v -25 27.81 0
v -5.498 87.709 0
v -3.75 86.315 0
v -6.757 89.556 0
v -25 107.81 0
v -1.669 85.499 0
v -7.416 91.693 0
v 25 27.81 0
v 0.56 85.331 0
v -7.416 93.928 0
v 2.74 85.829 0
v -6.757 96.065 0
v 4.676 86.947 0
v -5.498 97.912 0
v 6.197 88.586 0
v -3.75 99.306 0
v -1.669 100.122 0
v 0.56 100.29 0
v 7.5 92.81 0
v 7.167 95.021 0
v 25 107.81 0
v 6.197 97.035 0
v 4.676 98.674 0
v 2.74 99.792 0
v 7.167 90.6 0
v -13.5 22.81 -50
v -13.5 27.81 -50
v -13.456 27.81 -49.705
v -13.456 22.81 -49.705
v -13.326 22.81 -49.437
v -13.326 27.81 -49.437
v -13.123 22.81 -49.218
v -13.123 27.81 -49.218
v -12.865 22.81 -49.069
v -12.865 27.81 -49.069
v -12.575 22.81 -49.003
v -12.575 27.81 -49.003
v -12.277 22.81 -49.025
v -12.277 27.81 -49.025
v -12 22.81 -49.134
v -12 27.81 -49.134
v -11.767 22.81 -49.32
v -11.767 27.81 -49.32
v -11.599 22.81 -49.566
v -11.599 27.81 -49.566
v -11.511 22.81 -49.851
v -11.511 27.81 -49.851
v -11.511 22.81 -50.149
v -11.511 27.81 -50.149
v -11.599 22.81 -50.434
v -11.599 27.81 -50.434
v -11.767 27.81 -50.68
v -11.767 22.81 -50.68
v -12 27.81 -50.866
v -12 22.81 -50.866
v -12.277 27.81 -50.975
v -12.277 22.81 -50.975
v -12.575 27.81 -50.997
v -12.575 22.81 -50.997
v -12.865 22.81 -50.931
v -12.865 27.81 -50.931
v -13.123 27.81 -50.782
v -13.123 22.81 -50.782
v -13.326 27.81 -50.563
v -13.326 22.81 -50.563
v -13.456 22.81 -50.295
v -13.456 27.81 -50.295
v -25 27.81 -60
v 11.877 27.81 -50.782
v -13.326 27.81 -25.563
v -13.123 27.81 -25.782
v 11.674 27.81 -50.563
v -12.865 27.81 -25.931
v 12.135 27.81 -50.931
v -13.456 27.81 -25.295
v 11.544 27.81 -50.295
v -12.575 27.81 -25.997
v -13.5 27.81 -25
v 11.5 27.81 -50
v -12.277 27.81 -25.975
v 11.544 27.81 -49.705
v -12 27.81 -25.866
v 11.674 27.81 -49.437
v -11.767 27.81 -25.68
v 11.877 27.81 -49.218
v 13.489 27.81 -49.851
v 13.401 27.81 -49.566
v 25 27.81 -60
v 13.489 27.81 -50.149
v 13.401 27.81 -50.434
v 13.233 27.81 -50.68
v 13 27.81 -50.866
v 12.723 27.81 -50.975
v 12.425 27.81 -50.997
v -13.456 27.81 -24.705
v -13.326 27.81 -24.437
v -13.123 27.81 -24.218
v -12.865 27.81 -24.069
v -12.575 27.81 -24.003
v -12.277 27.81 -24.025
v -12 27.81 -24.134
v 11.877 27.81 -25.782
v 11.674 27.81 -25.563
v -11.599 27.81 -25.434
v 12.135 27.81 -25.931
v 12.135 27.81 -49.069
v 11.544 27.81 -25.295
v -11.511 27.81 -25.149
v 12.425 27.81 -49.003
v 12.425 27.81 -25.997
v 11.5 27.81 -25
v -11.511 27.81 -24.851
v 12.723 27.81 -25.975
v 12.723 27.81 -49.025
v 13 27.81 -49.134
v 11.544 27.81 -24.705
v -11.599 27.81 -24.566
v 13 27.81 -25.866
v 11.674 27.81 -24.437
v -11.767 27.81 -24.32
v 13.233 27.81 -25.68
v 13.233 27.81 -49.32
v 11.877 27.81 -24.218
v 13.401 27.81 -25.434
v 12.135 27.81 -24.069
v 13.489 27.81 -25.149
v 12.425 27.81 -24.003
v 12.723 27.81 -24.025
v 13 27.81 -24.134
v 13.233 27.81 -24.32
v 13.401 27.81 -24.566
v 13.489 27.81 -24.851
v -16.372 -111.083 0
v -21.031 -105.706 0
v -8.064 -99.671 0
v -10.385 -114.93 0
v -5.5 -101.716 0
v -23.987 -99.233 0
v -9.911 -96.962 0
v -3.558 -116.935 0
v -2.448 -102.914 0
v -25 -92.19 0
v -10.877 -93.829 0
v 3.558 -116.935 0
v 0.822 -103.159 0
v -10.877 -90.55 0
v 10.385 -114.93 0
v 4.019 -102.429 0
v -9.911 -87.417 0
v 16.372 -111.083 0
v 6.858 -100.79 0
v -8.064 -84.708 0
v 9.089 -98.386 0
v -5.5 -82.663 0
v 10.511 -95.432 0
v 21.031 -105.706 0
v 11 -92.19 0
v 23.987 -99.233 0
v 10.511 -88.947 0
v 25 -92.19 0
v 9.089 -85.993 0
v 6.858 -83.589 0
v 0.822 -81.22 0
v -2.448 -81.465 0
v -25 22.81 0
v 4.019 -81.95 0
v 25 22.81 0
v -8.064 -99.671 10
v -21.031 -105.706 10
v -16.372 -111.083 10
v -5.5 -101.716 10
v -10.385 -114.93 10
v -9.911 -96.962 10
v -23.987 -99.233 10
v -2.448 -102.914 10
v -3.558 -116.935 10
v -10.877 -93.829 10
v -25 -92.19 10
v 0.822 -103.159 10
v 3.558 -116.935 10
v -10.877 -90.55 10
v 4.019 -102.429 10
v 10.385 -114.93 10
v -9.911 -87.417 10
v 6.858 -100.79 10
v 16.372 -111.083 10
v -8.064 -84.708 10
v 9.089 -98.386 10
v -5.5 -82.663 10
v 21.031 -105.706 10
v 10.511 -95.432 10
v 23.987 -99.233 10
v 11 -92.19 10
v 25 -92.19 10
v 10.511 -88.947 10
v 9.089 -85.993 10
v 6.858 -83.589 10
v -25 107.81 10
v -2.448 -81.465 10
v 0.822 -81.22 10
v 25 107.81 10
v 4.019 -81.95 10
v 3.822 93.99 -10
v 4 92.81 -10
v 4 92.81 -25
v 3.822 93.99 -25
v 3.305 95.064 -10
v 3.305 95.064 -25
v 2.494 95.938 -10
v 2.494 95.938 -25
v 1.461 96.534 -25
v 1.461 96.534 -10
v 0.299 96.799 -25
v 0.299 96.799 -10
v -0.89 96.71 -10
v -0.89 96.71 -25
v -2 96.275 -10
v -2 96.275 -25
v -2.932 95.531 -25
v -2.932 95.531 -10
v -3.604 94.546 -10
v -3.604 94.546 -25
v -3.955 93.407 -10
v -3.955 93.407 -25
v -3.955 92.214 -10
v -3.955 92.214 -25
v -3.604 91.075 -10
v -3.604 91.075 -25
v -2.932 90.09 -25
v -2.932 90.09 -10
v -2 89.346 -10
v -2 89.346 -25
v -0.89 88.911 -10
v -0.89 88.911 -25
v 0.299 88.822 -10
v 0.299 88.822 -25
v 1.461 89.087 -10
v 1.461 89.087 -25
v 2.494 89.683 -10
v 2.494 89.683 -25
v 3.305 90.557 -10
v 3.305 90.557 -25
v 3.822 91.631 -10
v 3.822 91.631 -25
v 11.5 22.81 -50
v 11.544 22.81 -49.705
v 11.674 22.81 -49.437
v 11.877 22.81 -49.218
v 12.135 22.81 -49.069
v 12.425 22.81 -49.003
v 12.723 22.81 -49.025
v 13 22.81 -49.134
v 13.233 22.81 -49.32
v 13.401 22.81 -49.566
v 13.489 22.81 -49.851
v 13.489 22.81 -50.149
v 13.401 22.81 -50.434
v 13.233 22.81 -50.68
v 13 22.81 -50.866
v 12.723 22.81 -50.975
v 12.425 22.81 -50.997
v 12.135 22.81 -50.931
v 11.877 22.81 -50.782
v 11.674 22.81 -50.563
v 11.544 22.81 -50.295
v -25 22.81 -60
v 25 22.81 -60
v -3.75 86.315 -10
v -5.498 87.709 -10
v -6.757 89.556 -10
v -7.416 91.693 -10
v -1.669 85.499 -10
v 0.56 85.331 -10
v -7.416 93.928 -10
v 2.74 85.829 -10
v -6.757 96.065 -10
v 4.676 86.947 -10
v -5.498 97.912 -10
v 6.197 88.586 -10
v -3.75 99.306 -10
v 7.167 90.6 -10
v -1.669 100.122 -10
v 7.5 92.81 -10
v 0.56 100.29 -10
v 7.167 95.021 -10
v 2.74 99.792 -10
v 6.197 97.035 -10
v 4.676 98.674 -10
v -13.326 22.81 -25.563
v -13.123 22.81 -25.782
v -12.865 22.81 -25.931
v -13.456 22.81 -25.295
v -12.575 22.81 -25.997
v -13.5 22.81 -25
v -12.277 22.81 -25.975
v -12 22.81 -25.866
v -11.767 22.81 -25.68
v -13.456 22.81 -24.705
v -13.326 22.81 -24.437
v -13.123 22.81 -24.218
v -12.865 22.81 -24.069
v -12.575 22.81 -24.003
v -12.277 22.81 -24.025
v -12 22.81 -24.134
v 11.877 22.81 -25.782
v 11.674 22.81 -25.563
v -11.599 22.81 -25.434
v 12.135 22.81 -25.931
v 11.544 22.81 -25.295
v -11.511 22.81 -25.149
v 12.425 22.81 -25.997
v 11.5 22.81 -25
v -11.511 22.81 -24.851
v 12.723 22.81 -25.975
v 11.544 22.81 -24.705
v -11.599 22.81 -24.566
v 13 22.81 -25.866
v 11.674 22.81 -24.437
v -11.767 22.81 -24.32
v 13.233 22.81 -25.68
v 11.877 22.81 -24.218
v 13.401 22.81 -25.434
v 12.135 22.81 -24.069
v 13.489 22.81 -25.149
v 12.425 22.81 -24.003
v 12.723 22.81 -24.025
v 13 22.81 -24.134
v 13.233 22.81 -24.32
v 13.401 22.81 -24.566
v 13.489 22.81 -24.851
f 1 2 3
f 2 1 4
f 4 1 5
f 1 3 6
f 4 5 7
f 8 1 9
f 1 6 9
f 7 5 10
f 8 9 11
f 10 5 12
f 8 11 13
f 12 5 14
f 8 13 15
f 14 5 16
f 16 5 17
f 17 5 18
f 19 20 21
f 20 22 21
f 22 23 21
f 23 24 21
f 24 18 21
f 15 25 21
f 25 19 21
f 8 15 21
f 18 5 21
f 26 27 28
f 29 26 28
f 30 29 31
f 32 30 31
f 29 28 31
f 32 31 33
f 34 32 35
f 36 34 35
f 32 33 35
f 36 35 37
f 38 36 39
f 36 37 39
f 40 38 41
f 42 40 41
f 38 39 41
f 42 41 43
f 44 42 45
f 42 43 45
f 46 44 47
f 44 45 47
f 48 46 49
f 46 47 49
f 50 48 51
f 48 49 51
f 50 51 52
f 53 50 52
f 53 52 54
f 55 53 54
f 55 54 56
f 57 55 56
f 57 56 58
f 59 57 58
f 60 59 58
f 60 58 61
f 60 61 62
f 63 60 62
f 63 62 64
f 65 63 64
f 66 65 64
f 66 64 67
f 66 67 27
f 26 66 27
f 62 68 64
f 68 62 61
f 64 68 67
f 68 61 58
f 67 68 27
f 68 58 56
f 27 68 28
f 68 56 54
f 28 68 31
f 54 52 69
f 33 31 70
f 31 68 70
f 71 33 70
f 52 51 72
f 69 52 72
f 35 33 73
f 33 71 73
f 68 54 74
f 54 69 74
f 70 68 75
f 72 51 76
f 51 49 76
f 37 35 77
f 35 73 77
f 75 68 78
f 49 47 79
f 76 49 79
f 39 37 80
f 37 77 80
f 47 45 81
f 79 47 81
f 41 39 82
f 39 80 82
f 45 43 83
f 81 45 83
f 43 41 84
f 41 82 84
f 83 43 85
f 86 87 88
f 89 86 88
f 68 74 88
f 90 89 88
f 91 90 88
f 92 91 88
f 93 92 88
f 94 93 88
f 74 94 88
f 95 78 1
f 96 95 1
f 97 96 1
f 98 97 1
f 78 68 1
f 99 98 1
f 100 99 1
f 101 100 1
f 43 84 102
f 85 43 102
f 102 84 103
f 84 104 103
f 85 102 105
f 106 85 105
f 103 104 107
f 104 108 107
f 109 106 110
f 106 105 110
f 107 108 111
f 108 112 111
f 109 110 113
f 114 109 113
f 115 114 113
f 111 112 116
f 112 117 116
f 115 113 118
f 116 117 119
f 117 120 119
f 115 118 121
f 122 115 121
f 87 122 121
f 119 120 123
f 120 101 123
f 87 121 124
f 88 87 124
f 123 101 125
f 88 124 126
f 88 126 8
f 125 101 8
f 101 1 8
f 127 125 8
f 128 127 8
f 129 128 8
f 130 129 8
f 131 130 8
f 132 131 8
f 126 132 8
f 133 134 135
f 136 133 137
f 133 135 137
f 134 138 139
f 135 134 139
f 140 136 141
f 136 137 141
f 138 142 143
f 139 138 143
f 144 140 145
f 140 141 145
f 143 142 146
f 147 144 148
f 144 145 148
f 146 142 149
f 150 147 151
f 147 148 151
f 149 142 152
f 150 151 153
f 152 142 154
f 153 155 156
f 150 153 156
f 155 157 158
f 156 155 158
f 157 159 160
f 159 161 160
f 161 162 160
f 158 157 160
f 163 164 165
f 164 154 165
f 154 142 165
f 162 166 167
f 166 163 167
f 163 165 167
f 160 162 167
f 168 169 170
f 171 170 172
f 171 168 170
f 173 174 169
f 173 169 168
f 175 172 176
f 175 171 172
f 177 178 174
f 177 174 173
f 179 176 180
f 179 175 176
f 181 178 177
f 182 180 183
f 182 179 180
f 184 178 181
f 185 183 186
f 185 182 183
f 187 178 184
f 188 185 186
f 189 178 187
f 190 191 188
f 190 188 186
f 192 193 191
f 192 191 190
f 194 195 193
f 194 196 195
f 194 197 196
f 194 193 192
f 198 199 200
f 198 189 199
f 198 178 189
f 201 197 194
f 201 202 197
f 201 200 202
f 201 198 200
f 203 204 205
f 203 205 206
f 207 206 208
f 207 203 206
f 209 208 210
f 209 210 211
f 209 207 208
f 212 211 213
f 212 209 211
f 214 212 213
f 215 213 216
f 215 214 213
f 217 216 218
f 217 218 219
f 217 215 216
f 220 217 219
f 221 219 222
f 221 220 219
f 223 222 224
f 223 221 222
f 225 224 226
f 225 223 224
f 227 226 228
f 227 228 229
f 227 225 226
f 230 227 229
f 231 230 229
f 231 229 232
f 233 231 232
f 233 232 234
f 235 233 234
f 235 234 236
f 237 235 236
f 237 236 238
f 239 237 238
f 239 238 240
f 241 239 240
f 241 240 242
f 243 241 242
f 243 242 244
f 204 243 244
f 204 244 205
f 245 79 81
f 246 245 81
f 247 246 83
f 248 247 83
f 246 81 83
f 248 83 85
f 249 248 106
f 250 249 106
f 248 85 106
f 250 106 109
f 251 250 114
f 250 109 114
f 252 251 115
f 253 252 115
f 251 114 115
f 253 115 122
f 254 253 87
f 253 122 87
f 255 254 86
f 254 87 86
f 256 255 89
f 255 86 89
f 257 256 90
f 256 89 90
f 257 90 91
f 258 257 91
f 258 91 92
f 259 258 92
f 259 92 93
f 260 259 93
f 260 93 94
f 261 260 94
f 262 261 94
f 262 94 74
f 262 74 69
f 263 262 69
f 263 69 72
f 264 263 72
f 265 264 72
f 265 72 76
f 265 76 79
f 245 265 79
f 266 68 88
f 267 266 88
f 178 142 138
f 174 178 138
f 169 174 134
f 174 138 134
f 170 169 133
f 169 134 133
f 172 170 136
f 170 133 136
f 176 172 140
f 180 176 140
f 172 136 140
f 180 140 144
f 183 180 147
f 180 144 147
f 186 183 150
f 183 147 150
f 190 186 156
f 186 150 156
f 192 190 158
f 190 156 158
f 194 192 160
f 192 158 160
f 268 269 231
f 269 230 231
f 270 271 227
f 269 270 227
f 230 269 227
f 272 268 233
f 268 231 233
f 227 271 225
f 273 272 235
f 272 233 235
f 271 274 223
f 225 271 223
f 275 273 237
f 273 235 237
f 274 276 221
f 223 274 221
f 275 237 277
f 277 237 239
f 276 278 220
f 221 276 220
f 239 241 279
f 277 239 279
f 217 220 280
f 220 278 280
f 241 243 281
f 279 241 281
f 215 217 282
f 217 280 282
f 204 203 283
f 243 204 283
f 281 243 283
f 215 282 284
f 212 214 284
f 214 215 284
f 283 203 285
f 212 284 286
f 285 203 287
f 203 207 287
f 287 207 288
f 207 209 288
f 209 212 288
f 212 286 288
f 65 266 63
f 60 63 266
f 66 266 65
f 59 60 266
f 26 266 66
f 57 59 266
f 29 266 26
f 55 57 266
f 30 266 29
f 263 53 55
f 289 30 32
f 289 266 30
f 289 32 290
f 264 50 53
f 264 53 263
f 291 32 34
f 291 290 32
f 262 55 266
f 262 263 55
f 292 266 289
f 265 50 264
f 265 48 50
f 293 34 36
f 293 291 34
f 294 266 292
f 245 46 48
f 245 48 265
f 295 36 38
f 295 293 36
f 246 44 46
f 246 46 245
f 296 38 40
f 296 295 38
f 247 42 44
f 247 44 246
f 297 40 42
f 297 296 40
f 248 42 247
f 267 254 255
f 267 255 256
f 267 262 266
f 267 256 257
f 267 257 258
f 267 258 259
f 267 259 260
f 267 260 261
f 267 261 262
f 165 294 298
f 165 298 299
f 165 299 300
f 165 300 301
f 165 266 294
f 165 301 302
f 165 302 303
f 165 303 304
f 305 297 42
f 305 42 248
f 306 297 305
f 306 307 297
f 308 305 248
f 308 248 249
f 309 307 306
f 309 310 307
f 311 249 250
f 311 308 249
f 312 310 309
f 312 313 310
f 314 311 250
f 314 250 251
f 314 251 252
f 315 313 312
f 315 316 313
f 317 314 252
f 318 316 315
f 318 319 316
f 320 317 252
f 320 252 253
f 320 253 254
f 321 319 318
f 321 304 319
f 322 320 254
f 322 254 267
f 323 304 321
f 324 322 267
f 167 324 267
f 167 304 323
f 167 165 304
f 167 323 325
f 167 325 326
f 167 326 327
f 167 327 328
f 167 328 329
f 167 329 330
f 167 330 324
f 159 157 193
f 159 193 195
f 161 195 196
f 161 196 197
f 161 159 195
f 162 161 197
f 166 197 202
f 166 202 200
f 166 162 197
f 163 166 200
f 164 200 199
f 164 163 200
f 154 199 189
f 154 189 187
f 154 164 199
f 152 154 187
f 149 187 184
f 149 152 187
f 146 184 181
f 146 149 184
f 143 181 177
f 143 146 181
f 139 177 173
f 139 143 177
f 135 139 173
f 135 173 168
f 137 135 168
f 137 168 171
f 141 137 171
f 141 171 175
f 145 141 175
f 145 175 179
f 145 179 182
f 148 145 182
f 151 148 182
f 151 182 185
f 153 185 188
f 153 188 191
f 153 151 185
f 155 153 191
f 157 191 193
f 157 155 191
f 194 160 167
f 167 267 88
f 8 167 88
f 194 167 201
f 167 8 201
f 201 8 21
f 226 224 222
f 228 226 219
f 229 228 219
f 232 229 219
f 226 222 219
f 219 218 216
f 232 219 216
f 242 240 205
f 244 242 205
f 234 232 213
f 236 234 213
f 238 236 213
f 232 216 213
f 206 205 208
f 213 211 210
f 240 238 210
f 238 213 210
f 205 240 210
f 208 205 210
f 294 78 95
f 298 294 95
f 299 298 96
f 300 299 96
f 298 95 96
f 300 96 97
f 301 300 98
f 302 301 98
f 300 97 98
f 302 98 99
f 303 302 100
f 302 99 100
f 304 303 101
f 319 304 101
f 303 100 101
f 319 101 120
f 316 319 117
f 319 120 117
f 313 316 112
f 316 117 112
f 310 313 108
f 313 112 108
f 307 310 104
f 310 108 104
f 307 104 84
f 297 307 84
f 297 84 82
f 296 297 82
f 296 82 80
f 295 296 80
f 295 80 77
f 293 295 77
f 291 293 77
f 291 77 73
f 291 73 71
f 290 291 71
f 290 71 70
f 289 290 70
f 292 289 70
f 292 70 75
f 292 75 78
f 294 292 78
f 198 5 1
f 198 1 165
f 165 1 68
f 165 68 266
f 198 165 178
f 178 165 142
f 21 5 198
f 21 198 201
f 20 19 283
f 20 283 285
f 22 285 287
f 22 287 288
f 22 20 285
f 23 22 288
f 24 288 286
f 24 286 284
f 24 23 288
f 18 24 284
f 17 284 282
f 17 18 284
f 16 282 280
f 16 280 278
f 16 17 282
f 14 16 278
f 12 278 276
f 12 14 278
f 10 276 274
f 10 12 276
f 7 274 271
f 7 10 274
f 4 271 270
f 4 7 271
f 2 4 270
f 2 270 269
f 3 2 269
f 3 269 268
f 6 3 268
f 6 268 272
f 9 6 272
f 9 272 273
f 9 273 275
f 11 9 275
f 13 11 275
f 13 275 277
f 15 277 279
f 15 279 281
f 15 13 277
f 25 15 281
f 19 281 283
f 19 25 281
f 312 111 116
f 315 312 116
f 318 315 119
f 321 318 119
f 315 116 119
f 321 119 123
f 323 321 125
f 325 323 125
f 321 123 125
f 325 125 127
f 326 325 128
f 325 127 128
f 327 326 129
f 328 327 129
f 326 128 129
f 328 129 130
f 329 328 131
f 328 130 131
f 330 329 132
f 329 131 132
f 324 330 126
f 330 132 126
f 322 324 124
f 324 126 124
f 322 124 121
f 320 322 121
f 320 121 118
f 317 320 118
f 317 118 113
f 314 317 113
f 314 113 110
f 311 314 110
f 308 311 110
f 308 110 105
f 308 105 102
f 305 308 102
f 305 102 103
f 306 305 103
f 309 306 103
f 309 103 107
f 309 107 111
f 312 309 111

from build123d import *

# Parameters (mm, degrees)
F0_R     = 11
F0_W     = 50
F0_H     = 80
F0_R_2   = 7.5
F0_H_2   = 5
F0_R_3   = 4
F1_DEPTH = 10
F2_DEPTH = 60
F3_DEPTH = 10
F4_DEPTH = 25
F5_R     = 1
F6_DEPTH = 25


with BuildPart() as f1:
    # F0 (on Top) → F1 (new body)
    with BuildSketch(Plane.XY):
        with BuildLine():
            Line((-25, 22.8104994827), (-25, -92.1895005173))
            ThreePointArc((-25, -92.1895005173), (0, -117.1895005173), (25, -92.1895005173))
            Line((25, -92.1895005173), (25, 22.8104994827))
            Line((25, 22.8104994827), (-25, 22.8104994827))
        make_face()
        with Locations((0, -92.1895005173)):
            Circle(F0_R, mode=Mode.SUBTRACT)
        with Locations((0, 67.8104994827)):
            Rectangle(F0_W, F0_H)
        with Locations((0, 92.8104994827)):
            Circle(F0_R_2, mode=Mode.SUBTRACT)
        with Locations((0, 25.3104994827)):
            Rectangle(F0_W, F0_H_2)
        with Locations((0, 92.8104994827)):
            Circle(F0_R_2)
        with Locations((0, 92.8104994827)):
            Circle(F0_R_3, mode=Mode.SUBTRACT)
        with Locations((0, 92.8104994827)):
            Circle(F0_R_3)
    extrude(amount=F1_DEPTH)

    # F0 (on Top) → F2 (join)
    with BuildSketch(Plane.XY):
        with Locations((0, 25.3104994827)):
            Rectangle(F0_W, F0_H_2)
    extrude(amount=-F2_DEPTH)

    # F0 (on Top) → F3 (join)
    with BuildSketch(Plane.XY):
        with Locations((0, 92.8104994827)):
            Circle(F0_R_2)
        with Locations((0, 92.8104994827)):
            Circle(F0_R_3, mode=Mode.SUBTRACT)
    extrude(amount=-F3_DEPTH)

    # F0 (on Top) → F4 (join)
    with BuildSketch(Plane.XY):
        with Locations((0, 92.8104994827)):
            Circle(F0_R_3)
    extrude(amount=-F4_DEPTH)

    # F5 (on face) → F6 (cut)
    with BuildSketch(Plane(origin=(0, 27.8104994827, 0), x_dir=(-1, 0, 0), z_dir=(0, 1, 0))):
        with Locations((-12.5, -25)):
            Circle(F5_R)
        with Locations((12.5, -25)):
            Circle(F5_R)
        with Locations((-12.5, -50)):
            Circle(F5_R)
        with Locations((12.5, -50)):
            Circle(F5_R)
    extrude(amount=-F6_DEPTH, mode=Mode.SUBTRACT)


solid = f1.part
